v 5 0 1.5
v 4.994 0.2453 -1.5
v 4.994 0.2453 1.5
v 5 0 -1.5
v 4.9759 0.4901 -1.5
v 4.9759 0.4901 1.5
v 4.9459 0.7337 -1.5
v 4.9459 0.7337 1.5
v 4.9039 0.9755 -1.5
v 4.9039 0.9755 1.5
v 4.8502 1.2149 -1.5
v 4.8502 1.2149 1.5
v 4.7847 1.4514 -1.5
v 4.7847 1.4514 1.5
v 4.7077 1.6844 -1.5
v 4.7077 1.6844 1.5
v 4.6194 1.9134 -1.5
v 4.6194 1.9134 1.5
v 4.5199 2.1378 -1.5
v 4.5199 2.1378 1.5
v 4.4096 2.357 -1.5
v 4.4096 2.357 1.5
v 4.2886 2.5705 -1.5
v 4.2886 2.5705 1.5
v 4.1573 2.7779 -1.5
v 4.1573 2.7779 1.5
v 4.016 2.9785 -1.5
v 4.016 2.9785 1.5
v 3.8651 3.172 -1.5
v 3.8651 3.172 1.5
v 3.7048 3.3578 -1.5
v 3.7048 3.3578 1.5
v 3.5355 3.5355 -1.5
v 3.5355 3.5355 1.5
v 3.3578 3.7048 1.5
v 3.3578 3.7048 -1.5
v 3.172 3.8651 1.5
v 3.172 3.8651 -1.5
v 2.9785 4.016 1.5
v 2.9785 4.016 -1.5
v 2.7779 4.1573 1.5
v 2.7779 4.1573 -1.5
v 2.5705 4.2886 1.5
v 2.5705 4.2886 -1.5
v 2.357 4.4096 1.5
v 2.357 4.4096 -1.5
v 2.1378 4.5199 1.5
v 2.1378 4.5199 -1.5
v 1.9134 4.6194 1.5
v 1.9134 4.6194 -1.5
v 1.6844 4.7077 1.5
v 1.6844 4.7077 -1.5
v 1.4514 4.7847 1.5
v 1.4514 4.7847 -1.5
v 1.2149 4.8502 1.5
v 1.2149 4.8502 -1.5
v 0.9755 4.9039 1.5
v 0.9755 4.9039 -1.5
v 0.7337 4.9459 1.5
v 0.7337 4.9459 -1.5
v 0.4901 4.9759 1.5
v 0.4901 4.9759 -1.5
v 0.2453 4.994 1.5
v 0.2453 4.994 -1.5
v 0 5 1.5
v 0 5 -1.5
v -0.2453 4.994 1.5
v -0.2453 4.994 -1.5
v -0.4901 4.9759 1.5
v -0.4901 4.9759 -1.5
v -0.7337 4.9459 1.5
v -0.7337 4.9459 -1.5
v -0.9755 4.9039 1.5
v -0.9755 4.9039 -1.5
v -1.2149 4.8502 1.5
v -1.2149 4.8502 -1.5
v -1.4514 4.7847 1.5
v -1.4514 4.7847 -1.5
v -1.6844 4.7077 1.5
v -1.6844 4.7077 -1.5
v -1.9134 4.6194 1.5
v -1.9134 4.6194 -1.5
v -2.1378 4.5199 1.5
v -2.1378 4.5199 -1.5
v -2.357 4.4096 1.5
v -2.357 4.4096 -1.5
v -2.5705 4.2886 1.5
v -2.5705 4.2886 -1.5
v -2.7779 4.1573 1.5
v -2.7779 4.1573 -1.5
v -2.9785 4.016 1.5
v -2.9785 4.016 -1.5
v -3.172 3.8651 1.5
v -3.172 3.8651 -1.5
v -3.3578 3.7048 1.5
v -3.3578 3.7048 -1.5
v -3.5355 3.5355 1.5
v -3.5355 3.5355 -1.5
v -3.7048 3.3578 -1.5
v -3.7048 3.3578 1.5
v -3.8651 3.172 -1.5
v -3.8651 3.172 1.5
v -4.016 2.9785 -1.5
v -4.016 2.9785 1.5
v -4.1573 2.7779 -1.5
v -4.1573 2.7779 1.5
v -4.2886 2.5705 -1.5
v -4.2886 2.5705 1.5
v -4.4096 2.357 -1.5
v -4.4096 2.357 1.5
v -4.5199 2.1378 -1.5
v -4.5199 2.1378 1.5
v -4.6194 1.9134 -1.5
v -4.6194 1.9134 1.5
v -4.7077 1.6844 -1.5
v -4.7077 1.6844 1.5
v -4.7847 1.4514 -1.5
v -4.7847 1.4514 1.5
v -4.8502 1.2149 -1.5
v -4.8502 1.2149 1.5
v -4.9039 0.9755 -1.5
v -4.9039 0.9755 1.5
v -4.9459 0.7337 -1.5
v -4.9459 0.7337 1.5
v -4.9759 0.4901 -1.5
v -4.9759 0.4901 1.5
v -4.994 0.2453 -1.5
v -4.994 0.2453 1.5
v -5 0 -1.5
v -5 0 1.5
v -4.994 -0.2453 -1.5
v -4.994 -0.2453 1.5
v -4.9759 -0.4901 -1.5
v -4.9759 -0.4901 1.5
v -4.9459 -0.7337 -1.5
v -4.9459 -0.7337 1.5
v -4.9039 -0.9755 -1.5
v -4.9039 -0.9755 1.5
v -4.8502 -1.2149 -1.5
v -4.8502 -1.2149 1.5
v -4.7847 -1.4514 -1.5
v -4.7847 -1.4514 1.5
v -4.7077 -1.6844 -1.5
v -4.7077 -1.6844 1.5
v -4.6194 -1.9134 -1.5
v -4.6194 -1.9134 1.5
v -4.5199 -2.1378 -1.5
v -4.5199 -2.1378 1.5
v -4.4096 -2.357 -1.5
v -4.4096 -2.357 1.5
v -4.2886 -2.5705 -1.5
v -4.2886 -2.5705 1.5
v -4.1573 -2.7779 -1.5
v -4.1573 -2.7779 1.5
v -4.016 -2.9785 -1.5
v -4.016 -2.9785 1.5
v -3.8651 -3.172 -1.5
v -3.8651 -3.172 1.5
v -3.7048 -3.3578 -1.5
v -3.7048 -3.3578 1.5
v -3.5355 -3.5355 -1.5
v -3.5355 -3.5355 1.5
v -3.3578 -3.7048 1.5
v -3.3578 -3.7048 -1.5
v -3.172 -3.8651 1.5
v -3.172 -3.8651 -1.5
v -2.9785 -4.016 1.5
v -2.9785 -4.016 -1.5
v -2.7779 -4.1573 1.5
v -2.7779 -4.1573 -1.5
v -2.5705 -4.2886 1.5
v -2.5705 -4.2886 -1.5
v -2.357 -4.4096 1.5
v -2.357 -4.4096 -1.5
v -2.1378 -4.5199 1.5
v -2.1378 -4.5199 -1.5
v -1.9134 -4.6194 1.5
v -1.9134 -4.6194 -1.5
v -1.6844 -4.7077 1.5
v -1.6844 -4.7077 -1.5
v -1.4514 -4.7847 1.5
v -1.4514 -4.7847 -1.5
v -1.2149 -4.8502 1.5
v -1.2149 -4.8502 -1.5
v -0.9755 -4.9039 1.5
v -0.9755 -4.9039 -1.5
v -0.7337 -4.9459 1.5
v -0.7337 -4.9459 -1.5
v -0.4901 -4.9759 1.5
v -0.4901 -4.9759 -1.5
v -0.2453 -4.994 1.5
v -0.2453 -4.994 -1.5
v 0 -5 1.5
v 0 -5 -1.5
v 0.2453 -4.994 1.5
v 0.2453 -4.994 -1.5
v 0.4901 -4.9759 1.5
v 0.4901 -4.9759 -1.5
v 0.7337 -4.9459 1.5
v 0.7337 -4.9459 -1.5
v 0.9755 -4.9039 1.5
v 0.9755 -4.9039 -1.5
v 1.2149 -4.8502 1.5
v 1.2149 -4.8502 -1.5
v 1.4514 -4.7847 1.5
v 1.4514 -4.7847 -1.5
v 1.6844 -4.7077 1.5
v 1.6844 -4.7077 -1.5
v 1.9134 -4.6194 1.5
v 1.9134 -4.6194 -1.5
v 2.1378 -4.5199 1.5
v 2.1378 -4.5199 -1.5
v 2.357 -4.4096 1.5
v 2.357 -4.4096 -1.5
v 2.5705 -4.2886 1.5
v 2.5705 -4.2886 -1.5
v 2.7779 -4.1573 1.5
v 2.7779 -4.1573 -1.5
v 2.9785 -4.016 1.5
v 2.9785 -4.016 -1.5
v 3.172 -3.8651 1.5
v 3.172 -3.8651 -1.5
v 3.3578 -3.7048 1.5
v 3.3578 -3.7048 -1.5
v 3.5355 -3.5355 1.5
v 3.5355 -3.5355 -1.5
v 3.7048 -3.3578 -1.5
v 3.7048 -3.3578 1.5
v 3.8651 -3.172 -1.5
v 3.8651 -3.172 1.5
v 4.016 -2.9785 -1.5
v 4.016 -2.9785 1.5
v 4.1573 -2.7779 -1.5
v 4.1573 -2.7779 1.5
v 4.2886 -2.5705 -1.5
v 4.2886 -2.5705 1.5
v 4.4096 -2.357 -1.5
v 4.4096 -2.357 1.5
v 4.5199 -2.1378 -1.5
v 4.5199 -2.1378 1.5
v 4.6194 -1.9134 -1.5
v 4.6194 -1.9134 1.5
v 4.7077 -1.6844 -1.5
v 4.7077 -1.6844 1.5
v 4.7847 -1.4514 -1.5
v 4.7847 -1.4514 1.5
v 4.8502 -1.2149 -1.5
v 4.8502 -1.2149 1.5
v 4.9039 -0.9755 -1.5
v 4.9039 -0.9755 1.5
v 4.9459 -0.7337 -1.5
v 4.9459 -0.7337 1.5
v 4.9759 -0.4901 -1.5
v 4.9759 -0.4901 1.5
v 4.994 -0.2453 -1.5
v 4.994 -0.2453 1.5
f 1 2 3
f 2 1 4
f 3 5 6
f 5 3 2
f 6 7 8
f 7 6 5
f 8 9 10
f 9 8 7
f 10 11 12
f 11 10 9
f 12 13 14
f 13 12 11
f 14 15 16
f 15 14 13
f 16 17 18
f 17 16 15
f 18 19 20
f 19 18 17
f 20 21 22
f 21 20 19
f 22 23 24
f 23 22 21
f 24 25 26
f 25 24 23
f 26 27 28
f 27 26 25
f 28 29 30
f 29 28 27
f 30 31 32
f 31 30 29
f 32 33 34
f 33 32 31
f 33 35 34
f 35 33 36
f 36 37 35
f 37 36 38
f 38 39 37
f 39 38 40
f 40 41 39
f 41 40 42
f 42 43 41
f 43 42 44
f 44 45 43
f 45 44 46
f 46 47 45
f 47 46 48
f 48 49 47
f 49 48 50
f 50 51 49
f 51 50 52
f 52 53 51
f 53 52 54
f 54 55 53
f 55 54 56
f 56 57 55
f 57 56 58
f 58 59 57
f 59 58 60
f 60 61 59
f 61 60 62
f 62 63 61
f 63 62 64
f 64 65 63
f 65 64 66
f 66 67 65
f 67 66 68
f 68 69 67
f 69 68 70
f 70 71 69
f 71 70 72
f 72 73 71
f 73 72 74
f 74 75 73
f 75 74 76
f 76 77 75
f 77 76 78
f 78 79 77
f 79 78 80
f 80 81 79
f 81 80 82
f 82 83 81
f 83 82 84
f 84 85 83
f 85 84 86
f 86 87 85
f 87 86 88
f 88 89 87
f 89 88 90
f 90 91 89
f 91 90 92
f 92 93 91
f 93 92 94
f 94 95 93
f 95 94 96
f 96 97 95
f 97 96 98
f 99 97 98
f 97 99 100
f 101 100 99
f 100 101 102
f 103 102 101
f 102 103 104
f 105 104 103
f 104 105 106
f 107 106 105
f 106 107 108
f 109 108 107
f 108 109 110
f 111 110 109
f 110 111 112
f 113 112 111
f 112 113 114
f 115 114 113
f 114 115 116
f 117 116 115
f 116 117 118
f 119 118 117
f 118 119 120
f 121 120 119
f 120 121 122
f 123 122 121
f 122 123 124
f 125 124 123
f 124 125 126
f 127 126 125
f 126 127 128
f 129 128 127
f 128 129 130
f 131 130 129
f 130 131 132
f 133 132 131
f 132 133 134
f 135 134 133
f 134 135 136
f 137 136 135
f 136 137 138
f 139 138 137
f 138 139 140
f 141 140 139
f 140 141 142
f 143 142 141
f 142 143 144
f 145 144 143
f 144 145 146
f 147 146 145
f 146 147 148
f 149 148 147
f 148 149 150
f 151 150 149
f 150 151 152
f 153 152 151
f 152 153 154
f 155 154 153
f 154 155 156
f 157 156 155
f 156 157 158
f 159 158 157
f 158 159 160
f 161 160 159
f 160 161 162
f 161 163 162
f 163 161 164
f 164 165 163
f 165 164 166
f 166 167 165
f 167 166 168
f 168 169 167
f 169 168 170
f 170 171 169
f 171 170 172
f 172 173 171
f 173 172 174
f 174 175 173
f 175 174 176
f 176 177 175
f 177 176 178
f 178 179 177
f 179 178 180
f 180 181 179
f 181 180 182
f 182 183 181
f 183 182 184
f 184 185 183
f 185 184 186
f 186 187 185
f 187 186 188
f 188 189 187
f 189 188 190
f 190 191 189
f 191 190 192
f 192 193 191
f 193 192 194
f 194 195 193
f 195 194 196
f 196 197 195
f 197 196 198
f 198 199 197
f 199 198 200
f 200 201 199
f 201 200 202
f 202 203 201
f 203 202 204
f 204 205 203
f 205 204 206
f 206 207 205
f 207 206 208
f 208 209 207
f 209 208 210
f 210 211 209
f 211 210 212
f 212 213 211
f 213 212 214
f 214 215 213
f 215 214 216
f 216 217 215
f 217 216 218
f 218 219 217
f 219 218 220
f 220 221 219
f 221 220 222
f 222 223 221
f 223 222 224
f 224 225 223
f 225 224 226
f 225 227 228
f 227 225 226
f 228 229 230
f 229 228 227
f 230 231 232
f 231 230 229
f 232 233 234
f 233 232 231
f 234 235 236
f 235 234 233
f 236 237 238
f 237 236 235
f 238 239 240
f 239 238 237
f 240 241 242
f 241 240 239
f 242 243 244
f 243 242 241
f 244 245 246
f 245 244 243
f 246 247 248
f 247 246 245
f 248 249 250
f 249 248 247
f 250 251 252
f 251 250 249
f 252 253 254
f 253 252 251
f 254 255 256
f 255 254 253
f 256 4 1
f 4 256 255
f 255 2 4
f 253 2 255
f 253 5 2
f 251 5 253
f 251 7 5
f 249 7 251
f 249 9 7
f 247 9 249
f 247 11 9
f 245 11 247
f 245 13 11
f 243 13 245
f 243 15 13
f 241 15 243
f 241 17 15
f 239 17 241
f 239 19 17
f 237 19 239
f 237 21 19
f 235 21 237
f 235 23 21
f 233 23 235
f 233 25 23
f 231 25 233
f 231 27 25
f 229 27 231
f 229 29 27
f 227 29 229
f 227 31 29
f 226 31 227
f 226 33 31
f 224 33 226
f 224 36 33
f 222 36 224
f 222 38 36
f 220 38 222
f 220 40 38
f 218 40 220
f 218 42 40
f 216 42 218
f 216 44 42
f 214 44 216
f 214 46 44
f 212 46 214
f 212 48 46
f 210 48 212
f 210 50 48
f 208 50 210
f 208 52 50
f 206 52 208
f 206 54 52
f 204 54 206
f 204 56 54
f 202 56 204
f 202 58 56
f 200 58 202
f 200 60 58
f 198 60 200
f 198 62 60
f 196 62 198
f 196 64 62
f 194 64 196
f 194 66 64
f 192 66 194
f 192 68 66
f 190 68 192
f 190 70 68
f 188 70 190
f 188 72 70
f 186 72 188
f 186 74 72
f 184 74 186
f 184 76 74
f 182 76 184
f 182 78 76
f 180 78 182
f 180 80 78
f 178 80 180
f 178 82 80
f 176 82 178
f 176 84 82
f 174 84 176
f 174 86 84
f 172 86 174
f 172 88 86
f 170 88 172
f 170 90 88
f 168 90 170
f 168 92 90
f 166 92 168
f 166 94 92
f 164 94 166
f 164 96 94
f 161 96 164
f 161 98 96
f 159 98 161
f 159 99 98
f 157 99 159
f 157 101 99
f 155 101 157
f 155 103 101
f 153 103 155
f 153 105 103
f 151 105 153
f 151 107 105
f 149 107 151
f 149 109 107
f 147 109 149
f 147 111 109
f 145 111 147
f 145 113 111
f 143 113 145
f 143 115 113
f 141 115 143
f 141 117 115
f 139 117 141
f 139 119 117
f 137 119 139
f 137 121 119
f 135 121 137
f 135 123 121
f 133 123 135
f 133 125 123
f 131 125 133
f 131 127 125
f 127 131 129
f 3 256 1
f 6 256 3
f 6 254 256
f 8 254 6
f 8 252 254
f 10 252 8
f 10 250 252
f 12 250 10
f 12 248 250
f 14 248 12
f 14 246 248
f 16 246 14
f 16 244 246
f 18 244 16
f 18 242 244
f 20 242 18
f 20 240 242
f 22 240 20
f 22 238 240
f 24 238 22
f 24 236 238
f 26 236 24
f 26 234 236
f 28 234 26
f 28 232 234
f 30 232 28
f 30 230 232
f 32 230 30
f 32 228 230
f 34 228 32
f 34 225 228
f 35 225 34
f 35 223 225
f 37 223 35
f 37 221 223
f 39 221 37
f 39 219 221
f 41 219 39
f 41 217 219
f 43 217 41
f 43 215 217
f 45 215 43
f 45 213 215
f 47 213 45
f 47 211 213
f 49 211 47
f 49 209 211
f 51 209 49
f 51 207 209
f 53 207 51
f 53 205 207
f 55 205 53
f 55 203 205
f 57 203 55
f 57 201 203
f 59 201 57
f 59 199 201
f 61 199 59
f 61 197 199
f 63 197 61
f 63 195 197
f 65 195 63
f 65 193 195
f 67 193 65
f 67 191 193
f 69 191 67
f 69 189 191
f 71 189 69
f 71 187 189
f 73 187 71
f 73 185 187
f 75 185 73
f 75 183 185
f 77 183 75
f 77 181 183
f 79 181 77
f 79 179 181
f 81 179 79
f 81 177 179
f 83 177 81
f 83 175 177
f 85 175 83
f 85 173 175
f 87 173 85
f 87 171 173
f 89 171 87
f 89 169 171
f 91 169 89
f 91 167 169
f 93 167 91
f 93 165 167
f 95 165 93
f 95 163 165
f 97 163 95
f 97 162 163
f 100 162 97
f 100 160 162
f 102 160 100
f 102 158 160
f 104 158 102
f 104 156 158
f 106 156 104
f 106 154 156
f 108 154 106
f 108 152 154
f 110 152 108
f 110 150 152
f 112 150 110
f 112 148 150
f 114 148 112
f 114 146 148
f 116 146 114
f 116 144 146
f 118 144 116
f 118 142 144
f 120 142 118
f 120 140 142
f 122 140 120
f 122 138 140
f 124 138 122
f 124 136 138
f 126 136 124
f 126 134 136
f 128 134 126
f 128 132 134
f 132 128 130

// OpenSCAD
// Radial encoder magnet (single connected solid)

$fn = 128;

// Parameters
outer_diameter_mm = 10; //[5:20:1]
height_mm = 3;          //[1.5:6:0.5]
inner_diameter_mm = 0;  //[0:10:0.5]  // Set to 0 for solid disk (no bore)
bore_clearance_mm = 0.2; //[0:0.6:0.05]
bore_extra_height_mm = 1; //[0.5:3:0.5]

// Derived / safety
outer_r = max(outer_diameter_mm/2, 0.01);
h       = max(height_mm, 0.01);

// Bore (only if requested)
bore_r = max((inner_diameter_mm + bore_clearance_mm)/2, 0);

// Keep at least this wall thickness if a bore is enabled
min_wall_mm = 0.25;
bore_r_safe = min(bore_r, max(outer_r - min_wall_mm, 0));
do_bore = (inner_diameter_mm > 0) && (bore_r_safe > 0);

// Magnet - complete geometry (always one connected solid)
module magnet() {
  color([0.72, 0.45, 0.2])
  difference() {
    cylinder(r=outer_r, h=h, center=true);

    if (do_bore)
      cylinder(r=bore_r_safe, h=h + 2*bore_extra_height_mm, center=true);
  }
}

magnet();
